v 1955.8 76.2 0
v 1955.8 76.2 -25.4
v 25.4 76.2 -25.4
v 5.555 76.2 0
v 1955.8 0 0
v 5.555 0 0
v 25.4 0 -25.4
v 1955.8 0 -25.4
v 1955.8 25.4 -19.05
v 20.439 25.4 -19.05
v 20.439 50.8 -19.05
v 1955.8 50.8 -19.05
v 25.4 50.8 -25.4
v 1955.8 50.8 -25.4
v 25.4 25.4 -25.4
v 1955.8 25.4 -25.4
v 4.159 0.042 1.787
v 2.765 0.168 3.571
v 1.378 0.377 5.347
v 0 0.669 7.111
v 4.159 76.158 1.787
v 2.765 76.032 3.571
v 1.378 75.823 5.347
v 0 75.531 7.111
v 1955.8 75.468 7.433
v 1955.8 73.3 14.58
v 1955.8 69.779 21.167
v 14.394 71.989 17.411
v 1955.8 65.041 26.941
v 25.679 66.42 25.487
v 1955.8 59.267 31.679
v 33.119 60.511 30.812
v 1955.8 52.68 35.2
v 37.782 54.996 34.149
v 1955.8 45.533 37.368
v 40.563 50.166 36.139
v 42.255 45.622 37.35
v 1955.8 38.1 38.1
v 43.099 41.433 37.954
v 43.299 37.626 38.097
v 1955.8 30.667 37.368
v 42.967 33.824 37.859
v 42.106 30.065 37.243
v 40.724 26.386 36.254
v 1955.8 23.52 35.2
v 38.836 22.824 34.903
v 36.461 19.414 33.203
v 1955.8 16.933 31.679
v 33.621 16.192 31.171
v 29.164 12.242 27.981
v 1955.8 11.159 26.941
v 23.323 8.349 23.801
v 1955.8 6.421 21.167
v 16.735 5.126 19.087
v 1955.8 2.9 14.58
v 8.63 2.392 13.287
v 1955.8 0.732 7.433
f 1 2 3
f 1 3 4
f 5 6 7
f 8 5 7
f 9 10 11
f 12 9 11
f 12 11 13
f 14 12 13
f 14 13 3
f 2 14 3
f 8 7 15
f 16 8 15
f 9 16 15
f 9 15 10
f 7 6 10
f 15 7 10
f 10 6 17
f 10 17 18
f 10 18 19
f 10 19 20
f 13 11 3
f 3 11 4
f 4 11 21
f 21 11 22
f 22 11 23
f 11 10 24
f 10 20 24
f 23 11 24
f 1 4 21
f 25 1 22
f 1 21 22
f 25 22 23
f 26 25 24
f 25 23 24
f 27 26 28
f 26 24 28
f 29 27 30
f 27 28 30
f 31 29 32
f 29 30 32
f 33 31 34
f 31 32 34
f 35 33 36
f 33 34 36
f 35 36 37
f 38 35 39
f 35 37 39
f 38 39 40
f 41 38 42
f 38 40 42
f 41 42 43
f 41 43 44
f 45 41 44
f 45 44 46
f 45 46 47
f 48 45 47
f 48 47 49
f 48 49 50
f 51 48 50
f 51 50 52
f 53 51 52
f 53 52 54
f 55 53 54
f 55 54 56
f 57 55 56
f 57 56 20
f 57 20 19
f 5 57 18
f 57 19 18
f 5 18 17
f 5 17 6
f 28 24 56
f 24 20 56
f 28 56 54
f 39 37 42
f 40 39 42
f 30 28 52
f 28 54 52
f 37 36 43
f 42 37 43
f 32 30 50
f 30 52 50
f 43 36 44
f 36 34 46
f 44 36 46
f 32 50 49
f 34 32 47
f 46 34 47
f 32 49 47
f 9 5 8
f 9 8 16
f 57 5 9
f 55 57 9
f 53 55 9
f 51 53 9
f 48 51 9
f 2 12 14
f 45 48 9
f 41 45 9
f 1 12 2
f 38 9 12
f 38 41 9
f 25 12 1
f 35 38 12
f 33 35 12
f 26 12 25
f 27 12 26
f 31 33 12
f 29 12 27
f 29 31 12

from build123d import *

# Parameters (mm, degrees)
F1_DEPTH = 1955.8
F2_SIZE2 = 32.5105174577
F2_SIZE  = 25.4
F4_DEPTH = 76.201


# Not quite as in the source:
# - a feature names something its author has since deleted; it is built from what else it names


with BuildPart() as f1:
    # F0 (on Right) → F1 (new body)
    with BuildSketch(Plane.YZ):
        with BuildLine():
            Line((0, 0), (0, -25.4))
            Line((0, -25.4), (25.4, -25.4))
            Line((25.4, -25.4), (25.4, -19.05))
            Line((25.4, -19.05), (50.8, -19.05))
            Line((50.8, -19.05), (50.8, -25.4))
            Line((50.8, -25.4), (76.2, -25.4))
            Line((76.2, -25.4), (76.2, 0))
            ThreePointArc((76.2, 0), (38.1, 38.1), (0, 0))
        make_face()
    extrude(amount=F1_DEPTH)

    # F2
    f2_edges = [f1.edges().sort_by_distance(p)[0] for p in [
        (0, 12.7, -25.4),
    ]]
    f2_side = f1.faces().sort_by_distance((977.9, 12.7, -25.4))[0]
    chamfer(f2_edges, length=F2_SIZE, length2=F2_SIZE2, reference=f2_side)

    # F3 (on Front) → F4 (cut, through all)
    with BuildSketch(Plane.XZ):
        Polygon((44.9116937816, 39.251241833), (17.98238638, 50.449128889), (0, 45.5416738987), (0, 7.1105174577), align=None)
    extrude(amount=-F4_DEPTH, mode=Mode.SUBTRACT)


solid = f1.part
